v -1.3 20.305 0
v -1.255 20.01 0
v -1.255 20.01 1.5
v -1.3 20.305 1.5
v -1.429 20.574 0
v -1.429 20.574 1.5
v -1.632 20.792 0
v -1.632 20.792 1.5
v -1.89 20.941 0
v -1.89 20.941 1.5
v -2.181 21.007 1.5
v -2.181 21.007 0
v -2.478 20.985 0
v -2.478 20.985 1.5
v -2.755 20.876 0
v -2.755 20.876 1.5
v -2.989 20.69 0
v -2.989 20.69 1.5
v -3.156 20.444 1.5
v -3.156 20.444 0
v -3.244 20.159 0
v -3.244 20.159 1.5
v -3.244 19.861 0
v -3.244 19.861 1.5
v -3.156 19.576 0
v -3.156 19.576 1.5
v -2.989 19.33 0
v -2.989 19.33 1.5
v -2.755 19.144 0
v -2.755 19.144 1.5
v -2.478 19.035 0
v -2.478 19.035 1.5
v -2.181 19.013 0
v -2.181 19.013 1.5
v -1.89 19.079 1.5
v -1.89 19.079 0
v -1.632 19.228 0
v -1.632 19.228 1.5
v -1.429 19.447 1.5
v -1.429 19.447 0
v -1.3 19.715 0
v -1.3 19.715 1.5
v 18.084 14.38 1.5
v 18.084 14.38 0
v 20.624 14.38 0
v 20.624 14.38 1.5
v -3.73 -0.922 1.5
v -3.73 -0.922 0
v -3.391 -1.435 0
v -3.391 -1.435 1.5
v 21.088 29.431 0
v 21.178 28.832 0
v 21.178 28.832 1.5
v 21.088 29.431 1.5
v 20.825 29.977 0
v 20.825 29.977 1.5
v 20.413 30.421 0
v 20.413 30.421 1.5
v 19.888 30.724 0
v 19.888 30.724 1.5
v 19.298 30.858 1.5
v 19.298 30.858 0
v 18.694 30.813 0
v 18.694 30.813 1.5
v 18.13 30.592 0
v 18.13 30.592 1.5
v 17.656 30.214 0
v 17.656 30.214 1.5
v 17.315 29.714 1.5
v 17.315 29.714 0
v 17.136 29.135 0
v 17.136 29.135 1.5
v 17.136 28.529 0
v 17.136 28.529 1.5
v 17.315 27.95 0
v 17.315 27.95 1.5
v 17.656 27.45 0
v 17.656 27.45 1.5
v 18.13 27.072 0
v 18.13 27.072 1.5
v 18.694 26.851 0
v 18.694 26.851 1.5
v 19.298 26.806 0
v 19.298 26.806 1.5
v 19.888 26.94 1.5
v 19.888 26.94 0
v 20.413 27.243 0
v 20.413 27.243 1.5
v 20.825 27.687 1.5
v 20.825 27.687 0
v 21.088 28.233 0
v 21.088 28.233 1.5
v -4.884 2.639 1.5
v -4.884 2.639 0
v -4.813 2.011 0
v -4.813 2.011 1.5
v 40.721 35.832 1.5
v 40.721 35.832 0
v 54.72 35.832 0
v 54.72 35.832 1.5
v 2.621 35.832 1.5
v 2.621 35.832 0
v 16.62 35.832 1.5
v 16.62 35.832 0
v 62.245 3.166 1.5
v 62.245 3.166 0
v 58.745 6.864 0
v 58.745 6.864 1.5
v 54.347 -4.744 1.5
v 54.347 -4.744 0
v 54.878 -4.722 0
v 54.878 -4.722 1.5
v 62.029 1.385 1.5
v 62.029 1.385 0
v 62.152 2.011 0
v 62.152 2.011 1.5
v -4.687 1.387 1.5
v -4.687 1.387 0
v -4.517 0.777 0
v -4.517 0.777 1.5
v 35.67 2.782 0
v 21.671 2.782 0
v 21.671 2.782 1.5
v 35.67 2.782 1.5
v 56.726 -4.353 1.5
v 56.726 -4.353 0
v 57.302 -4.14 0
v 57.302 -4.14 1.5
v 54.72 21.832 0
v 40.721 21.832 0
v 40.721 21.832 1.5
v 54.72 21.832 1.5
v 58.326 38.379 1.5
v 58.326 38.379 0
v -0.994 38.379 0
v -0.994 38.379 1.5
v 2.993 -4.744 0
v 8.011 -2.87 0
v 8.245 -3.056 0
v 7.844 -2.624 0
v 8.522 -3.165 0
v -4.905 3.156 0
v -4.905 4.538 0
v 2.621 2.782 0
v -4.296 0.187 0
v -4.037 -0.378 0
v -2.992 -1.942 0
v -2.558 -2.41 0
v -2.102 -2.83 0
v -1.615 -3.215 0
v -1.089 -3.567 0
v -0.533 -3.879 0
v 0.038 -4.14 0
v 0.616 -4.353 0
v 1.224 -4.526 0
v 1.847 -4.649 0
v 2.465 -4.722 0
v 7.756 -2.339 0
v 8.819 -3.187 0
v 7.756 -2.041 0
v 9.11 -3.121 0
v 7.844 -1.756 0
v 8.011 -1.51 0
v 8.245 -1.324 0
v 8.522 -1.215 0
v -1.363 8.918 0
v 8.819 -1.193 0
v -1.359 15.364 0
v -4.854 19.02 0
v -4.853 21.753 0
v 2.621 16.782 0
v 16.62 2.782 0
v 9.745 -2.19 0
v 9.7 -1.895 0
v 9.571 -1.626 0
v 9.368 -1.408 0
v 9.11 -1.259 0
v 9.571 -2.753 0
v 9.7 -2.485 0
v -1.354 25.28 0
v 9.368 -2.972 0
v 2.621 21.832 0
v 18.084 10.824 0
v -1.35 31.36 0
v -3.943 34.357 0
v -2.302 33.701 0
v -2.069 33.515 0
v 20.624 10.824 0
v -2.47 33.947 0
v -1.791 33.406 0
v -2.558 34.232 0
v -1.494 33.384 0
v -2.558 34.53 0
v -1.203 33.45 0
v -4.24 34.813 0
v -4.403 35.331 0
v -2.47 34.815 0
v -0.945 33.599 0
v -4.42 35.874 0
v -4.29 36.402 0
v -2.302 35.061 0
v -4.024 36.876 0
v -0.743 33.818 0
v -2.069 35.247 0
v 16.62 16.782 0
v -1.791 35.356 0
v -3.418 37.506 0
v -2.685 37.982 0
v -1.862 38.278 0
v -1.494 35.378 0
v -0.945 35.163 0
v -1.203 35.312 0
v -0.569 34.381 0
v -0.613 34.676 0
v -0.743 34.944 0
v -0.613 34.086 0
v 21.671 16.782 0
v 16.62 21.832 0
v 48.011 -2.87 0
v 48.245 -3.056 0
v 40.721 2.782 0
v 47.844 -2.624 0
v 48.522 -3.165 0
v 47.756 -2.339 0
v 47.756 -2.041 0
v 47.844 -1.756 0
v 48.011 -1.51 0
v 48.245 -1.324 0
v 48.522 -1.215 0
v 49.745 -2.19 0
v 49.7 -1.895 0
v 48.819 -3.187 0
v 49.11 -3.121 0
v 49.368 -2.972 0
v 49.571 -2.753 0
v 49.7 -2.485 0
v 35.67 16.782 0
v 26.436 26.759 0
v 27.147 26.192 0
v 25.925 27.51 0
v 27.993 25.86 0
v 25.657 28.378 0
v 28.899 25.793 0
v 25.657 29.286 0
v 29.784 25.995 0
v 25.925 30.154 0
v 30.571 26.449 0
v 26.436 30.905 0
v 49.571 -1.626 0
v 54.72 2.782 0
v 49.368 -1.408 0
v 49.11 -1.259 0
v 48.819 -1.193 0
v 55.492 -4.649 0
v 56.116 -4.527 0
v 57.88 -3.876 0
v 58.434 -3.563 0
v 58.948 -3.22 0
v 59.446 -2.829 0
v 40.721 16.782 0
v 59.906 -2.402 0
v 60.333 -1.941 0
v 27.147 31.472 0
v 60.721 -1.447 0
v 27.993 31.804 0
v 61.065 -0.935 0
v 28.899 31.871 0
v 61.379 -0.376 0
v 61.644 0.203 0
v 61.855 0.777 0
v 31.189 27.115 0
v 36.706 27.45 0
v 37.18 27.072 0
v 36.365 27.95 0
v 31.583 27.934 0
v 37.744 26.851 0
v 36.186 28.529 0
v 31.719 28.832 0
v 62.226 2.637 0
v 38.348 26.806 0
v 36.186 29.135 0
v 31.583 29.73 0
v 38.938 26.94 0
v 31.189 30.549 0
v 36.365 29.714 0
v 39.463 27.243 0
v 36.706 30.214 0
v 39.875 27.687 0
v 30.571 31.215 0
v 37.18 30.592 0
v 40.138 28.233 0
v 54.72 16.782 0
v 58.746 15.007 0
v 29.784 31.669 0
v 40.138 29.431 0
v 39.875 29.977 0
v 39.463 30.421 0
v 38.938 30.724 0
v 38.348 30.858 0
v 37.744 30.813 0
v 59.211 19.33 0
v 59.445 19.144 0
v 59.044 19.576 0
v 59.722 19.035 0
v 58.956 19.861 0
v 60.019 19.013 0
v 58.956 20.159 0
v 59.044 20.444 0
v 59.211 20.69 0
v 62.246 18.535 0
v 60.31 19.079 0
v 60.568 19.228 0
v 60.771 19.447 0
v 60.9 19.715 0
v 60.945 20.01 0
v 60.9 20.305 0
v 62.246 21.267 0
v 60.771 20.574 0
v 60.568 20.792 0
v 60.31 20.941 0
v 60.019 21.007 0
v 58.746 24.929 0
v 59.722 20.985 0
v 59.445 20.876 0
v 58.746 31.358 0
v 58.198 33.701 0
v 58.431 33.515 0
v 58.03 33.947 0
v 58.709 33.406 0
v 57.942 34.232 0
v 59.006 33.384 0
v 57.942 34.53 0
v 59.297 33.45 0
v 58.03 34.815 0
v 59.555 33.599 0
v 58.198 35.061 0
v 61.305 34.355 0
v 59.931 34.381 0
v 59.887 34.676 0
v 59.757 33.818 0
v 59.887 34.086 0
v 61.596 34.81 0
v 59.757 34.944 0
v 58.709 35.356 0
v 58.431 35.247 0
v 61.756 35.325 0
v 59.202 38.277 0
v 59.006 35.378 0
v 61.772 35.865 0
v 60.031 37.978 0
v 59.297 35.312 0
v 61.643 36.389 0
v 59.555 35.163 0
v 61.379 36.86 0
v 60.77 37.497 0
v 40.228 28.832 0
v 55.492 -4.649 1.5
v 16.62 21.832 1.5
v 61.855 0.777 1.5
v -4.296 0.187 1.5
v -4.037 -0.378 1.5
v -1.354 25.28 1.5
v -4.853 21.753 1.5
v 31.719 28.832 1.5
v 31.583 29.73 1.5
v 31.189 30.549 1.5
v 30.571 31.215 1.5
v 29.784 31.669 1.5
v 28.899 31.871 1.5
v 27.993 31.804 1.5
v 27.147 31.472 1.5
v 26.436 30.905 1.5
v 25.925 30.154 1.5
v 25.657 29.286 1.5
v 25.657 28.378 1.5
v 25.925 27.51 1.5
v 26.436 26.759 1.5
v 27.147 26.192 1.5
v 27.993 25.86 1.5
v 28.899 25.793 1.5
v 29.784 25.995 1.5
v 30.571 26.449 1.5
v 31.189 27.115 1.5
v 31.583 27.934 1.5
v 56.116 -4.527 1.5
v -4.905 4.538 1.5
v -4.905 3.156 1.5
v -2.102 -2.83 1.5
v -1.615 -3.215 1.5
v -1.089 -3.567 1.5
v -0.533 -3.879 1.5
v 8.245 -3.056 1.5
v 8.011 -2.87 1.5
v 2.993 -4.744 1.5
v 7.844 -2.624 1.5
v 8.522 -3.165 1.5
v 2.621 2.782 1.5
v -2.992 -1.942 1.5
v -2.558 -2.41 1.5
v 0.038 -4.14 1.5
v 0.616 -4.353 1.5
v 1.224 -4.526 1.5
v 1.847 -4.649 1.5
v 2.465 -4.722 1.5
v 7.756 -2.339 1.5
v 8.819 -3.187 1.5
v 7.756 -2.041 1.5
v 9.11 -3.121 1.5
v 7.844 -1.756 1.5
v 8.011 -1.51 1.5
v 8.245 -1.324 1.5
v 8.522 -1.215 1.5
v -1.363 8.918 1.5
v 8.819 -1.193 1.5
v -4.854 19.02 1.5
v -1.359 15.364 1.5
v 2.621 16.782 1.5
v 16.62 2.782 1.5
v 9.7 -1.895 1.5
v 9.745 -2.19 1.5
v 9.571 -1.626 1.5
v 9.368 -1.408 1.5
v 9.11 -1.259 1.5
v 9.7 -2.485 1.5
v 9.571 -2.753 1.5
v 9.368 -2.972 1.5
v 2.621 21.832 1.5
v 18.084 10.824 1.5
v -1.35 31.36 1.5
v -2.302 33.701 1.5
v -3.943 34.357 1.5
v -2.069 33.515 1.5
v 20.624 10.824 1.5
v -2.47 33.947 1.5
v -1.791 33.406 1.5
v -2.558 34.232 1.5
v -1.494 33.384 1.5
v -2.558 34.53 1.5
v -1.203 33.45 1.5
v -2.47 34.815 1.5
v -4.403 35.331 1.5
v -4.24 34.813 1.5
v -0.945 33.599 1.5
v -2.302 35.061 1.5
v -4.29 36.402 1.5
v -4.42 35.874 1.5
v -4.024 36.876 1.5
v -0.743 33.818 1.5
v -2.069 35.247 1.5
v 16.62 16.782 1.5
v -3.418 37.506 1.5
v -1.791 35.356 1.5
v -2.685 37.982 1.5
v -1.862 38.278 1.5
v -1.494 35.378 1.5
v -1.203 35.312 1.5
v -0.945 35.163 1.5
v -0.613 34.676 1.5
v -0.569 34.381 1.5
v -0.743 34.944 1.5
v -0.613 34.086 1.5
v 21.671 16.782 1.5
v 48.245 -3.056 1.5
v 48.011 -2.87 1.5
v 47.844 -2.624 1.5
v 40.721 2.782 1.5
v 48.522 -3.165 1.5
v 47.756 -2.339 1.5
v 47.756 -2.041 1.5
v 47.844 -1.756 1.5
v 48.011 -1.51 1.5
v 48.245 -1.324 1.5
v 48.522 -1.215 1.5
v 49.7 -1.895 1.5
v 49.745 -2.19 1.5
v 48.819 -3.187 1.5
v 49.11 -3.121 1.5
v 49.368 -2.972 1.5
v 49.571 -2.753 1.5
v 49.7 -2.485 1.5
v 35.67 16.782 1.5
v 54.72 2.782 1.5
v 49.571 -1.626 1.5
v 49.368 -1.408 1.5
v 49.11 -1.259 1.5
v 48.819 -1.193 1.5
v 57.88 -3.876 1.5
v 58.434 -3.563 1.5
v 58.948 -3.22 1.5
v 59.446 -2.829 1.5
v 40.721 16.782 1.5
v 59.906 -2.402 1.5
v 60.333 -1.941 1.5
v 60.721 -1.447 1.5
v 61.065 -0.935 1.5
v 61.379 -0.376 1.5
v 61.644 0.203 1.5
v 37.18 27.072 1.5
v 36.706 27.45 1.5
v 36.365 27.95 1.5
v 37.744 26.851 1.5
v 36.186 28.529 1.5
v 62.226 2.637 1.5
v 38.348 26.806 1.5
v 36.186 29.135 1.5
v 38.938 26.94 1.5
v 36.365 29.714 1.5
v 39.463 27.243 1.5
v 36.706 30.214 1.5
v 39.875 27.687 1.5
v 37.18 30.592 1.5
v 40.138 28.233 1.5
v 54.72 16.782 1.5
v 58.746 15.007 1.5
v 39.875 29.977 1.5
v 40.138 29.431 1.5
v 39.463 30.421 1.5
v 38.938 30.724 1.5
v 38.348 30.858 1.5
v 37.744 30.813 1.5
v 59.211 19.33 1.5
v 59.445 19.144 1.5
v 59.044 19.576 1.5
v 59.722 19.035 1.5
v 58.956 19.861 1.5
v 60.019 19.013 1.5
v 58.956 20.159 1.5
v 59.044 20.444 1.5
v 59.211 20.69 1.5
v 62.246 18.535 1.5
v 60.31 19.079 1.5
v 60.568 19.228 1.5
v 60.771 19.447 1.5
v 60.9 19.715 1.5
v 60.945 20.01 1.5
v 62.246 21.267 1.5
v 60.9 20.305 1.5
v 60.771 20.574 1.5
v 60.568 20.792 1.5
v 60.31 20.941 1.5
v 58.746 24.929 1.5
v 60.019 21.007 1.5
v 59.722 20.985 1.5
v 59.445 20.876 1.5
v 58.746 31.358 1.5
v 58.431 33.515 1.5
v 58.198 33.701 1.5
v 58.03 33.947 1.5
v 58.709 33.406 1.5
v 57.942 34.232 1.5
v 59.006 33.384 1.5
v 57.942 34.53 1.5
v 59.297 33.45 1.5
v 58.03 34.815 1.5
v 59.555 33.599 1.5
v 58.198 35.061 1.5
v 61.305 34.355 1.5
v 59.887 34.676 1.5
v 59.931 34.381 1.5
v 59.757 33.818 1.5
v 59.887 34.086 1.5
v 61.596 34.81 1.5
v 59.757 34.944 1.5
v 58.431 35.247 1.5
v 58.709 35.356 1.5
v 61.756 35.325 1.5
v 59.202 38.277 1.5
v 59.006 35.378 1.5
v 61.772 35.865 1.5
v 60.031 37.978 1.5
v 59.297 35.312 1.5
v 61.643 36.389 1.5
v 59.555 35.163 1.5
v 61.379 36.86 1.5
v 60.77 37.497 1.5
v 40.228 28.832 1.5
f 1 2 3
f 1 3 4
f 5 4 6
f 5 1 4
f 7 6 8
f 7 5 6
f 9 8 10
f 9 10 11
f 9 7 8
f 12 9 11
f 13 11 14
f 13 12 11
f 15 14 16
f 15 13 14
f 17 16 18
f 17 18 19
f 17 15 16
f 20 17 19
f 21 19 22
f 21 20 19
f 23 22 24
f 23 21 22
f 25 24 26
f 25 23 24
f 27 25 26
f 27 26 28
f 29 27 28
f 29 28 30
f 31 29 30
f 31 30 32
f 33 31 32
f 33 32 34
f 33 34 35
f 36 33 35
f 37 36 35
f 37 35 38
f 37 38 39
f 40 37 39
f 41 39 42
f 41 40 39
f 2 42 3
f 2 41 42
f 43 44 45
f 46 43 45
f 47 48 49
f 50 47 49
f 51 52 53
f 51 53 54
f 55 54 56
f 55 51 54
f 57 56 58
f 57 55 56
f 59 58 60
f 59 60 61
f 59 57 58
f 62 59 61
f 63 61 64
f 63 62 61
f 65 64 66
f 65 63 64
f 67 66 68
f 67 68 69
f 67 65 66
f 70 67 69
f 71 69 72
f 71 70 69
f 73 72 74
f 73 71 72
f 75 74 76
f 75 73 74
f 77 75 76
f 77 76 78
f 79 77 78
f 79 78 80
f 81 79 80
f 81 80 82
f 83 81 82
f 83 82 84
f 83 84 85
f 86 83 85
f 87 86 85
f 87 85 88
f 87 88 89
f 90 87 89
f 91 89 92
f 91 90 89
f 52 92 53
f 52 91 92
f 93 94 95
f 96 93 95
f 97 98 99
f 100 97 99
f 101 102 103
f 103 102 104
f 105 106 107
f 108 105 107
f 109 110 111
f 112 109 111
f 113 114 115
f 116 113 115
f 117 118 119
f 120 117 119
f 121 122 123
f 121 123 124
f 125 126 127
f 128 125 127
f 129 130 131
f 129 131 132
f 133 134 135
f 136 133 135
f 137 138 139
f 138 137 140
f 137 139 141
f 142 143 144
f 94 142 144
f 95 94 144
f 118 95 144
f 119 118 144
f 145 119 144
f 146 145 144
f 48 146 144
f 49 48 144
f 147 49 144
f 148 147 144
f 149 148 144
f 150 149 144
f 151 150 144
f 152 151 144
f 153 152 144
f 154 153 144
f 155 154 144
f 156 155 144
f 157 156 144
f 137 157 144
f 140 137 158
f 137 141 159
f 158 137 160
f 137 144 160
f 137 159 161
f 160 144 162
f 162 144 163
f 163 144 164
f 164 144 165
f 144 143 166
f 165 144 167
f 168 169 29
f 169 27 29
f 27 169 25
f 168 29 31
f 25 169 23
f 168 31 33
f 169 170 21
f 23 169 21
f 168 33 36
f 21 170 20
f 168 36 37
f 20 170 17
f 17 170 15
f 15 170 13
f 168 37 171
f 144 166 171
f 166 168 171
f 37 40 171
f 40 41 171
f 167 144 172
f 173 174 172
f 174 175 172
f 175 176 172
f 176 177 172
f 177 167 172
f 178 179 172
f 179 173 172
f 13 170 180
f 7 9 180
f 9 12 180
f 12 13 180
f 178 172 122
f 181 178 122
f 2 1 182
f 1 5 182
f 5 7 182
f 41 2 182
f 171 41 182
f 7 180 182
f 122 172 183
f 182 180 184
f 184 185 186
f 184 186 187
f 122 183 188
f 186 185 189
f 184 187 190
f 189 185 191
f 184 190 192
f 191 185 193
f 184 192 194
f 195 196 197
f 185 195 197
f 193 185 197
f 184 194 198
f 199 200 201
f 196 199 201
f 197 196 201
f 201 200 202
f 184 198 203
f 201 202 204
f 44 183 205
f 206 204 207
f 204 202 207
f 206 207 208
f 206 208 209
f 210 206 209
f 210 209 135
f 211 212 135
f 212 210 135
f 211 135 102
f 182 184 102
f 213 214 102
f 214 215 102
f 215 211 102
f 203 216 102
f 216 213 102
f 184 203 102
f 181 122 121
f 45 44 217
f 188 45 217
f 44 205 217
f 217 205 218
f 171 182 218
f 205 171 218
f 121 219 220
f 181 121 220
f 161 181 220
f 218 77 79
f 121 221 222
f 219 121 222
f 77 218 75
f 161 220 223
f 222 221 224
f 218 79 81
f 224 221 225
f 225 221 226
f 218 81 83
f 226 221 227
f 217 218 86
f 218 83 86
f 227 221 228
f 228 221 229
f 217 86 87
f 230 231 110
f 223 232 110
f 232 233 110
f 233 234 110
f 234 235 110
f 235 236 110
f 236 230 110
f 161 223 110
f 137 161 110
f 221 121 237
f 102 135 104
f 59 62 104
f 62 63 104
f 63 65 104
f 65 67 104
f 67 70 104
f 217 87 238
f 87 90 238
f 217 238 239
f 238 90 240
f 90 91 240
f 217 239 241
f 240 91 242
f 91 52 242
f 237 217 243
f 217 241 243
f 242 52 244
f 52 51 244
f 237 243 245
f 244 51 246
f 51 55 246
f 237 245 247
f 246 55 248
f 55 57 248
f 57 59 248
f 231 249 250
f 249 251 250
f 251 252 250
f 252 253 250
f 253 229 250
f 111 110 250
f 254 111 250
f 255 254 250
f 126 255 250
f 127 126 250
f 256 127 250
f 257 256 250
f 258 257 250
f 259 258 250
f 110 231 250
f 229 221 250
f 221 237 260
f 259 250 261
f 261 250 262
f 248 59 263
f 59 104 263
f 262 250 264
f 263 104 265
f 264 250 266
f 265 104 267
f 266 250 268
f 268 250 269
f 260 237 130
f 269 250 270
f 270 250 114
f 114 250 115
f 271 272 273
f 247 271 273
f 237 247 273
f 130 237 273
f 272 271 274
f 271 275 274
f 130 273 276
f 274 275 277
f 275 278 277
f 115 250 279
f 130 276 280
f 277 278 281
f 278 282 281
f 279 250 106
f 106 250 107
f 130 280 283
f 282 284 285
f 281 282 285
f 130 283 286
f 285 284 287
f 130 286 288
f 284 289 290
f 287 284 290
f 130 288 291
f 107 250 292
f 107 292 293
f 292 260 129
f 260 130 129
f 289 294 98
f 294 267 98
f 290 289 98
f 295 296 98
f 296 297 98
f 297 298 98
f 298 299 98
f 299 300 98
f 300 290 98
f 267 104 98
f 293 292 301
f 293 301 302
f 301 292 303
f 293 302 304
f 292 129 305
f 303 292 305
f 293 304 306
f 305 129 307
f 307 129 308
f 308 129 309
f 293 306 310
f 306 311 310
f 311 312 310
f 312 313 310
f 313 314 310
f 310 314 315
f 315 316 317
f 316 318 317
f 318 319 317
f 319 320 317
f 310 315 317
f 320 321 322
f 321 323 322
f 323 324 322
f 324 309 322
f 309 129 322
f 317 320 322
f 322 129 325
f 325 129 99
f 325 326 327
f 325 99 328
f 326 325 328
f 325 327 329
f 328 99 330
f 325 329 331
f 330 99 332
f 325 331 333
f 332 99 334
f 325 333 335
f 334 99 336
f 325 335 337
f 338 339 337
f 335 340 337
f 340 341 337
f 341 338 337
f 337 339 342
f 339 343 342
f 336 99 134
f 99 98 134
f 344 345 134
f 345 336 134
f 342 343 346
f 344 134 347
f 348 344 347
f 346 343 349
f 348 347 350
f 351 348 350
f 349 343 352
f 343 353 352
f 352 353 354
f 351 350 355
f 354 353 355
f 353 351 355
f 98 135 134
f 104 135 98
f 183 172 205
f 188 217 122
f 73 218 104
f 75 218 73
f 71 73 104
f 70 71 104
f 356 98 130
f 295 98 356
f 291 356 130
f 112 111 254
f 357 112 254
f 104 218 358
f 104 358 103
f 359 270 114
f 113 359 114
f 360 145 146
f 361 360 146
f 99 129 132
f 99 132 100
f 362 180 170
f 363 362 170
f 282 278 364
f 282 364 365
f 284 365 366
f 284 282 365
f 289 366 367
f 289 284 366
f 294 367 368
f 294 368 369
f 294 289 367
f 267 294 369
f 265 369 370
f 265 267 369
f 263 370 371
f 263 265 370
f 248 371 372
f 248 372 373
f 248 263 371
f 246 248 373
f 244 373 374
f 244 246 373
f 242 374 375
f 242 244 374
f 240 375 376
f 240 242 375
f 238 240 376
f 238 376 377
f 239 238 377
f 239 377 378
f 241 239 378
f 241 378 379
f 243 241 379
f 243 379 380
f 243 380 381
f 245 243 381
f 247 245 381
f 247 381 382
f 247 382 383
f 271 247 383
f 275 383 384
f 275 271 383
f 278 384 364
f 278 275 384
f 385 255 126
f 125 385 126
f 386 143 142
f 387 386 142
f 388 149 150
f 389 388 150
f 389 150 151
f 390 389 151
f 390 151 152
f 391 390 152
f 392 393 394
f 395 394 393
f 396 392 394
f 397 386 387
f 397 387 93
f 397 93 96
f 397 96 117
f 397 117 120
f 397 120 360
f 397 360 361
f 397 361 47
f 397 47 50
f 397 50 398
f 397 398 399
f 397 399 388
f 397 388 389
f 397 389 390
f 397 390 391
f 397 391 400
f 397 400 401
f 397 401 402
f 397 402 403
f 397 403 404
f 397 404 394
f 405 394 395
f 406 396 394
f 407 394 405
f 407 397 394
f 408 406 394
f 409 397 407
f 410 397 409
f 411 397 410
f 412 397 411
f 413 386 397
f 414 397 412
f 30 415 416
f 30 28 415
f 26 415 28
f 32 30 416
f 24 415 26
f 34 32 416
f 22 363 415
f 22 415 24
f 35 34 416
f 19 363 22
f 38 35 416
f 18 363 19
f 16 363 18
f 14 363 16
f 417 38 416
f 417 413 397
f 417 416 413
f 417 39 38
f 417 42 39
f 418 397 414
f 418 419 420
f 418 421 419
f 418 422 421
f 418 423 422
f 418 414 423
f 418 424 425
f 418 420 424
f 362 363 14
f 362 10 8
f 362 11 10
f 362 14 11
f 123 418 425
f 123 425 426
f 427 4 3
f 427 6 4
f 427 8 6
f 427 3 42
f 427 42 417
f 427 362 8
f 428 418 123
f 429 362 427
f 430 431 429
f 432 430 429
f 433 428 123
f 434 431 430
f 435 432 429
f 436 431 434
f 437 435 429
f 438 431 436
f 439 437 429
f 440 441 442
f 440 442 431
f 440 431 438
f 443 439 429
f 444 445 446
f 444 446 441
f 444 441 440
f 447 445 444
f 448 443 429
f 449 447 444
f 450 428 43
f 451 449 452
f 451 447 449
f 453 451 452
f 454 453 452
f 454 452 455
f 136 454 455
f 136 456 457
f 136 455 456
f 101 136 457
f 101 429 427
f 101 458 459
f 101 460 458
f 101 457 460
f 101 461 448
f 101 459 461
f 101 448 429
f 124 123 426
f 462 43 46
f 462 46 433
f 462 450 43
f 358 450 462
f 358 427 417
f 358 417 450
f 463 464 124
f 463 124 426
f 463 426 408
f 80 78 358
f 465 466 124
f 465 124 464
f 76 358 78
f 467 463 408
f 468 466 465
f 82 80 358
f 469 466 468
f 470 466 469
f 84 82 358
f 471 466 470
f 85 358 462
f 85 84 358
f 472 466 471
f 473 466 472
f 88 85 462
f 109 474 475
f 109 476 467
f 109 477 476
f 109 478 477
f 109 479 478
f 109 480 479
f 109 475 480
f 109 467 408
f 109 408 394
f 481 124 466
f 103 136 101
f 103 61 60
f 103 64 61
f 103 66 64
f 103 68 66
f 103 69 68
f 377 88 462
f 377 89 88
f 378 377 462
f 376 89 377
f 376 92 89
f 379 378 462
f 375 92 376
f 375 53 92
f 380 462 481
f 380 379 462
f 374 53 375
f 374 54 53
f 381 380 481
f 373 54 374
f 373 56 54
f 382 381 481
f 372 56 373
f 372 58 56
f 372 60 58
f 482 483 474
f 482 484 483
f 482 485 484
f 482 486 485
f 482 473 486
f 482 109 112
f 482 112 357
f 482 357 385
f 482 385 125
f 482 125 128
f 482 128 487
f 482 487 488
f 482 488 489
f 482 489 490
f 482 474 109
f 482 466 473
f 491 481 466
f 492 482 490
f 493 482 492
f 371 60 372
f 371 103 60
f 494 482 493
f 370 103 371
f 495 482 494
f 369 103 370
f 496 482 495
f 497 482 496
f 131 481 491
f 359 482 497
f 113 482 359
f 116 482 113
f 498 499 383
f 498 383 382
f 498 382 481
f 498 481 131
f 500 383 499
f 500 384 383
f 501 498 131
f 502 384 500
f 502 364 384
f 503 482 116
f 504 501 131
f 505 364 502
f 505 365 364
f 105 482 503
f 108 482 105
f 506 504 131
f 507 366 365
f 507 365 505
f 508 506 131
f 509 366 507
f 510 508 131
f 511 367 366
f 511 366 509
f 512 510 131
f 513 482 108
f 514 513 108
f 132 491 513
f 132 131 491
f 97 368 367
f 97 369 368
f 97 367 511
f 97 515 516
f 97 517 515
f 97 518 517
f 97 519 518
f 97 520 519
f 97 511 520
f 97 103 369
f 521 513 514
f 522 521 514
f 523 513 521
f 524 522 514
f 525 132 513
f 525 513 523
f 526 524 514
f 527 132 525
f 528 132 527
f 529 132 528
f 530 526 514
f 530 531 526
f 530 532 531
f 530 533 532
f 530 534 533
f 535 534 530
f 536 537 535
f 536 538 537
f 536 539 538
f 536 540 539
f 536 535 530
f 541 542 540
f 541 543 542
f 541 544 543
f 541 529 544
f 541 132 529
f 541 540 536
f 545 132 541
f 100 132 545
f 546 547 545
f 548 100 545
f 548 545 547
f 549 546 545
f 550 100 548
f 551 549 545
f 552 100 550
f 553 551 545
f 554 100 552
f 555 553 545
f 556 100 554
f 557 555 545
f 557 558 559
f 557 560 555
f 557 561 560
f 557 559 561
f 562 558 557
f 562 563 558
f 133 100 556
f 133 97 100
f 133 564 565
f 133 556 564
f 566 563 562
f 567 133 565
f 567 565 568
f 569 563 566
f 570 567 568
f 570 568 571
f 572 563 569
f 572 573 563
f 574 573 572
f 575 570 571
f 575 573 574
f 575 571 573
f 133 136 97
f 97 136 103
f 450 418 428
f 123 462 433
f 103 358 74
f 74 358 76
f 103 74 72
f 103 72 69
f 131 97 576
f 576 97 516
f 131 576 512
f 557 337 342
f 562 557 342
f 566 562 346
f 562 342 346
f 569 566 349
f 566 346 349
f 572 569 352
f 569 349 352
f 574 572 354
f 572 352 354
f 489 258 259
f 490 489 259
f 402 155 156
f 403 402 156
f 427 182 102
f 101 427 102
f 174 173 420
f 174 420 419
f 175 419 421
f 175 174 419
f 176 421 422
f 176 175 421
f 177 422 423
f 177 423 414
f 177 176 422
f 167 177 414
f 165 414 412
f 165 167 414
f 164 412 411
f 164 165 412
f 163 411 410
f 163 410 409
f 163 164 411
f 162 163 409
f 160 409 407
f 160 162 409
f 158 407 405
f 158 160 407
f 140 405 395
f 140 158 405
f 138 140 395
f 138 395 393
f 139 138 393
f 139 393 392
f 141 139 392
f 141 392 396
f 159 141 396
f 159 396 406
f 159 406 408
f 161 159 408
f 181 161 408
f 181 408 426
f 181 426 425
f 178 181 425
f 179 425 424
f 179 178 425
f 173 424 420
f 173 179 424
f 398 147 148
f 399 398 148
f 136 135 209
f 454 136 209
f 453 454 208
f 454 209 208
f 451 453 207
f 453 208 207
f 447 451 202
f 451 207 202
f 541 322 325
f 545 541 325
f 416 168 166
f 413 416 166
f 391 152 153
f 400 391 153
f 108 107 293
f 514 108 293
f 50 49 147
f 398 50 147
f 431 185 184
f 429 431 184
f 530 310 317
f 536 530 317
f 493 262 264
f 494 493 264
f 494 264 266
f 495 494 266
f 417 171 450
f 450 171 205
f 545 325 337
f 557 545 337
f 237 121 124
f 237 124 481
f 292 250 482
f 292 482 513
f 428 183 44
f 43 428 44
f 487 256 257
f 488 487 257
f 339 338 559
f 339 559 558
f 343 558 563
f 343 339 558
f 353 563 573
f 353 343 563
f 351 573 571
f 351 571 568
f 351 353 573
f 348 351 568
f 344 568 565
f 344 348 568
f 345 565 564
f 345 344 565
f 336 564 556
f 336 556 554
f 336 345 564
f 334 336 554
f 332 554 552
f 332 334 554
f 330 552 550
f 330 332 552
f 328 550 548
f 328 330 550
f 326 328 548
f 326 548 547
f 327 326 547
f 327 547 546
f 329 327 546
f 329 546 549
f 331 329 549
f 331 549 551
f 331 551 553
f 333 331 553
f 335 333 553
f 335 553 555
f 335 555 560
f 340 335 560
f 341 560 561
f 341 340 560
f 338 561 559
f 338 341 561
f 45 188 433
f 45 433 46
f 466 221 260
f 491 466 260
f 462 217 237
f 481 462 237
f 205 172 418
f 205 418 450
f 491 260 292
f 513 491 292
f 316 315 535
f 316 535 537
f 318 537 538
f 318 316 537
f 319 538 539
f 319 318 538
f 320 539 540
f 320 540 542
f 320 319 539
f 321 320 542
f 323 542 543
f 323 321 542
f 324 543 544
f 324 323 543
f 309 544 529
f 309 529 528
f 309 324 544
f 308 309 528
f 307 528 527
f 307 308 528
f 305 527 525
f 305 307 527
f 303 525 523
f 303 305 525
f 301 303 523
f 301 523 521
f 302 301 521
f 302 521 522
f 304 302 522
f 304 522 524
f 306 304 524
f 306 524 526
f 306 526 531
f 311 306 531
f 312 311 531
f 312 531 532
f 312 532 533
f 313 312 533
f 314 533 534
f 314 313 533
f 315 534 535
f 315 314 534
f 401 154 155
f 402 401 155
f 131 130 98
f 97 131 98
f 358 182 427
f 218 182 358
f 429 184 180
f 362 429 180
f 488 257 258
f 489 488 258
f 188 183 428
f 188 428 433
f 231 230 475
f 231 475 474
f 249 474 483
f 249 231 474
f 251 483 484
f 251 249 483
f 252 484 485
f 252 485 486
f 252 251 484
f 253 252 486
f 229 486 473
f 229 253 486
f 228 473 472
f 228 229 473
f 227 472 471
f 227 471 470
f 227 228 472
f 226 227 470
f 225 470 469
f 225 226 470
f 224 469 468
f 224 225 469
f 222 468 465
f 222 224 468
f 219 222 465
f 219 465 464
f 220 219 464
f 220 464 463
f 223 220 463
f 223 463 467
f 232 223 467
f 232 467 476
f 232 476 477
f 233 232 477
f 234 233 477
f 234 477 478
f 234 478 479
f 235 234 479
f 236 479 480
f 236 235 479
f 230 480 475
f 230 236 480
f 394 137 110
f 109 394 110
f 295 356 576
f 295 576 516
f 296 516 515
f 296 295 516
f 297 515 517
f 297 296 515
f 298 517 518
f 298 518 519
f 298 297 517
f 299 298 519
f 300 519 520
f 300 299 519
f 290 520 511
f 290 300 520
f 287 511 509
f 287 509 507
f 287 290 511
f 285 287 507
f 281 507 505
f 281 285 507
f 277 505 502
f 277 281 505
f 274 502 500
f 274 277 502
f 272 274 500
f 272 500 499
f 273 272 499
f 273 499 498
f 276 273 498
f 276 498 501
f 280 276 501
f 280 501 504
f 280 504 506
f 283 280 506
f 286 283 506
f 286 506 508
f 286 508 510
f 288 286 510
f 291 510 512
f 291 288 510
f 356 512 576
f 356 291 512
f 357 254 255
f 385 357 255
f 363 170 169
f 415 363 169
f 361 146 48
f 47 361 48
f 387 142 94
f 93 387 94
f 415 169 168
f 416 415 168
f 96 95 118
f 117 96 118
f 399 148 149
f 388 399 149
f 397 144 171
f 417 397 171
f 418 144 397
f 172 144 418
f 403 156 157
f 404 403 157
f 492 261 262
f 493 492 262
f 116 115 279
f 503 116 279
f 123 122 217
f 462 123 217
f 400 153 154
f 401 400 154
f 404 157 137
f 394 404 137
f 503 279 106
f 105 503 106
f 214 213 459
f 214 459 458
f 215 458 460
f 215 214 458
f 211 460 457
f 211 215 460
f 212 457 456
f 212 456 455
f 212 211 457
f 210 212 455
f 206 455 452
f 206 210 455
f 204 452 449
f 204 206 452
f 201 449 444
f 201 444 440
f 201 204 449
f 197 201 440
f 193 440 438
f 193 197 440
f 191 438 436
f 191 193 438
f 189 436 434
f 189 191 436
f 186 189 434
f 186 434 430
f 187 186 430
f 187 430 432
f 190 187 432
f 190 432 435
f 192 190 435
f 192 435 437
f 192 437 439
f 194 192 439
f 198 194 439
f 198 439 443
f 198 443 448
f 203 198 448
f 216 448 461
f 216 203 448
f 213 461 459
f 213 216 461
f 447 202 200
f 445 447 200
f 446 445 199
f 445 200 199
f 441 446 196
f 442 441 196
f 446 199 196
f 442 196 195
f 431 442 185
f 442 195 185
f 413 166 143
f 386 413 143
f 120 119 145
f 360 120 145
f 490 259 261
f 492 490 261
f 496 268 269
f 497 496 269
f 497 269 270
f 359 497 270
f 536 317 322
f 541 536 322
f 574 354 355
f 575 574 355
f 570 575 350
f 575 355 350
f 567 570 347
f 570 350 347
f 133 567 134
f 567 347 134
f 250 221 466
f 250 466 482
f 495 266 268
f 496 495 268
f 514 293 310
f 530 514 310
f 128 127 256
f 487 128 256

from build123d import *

# Parameters (mm, degrees)
MODEL_R         = 1
MODEL_W         = 13.99947
MODEL_H         = 13.99944
MODEL_W_2       = 2.54
MODEL_H_2       = 3.556
MODEL_W_3       = 13.9994
MODEL_W_4       = 13.9993
MODEL_H_3       = 13.9993
MODEL_R_2       = 2.032
MODEL_R_3       = 3.048
EXTRUDE_1_DEPTH = 1.5


with BuildPart() as part:
    # Model → 凸台-拉伸1 (new body)
    with BuildSketch(Plane.XY):
        with BuildLine():
            Line((58.325971896, 38.37894176), (-0.993511809, 38.37894176))
            ThreePointArc((-0.993511809, 38.37894176), (-2.684760262, 37.982445858), (-4.023562246, 36.875585623))
            ThreePointArc((-4.023562246, 36.875585623), (-4.429985557, 35.602098535), (-3.943386617, 34.357040005))
            Line((-3.943386617, 34.357040005), (-1.350000064, 31.36000149))
            Line((-1.350000064, 31.36000149), (-1.353515518, 25.280051374))
            Line((-1.353515518, 25.280051374), (-4.853428588, 21.752613865))
            Line((-4.853428588, 21.752613865), (-4.853710523, 19.020120221))
            Line((-4.853710523, 19.020120221), (-1.359258514, 15.363920359))
            Line((-1.359258514, 15.363920359), (-1.362991715, 8.917997305))
            Line((-1.362991715, 8.917997305), (-4.9049154, 4.538497879))
            Line((-4.9049154, 4.538497879), (-4.9049154, 3.15597541))
            Line((-4.9049154, 3.15597541), (-4.883883595, 2.639206616))
            Line((-4.883883595, 2.639206616), (-4.813264805, 2.011073476))
            Line((-4.813264805, 2.011073476), (-4.687062167, 1.387481119))
            Line((-4.687062167, 1.387481119), (-4.516803943, 0.776764684))
            Line((-4.516803943, 0.776764684), (-4.295659415, 0.187060206))
            Line((-4.295659415, 0.187060206), (-4.03681533, -0.378036856))
            Line((-4.03681533, -0.378036856), (-3.730362364, -0.921623746))
            Line((-3.730362364, -0.921623746), (-3.390574278, -1.434889052))
            Line((-3.390574278, -1.434889052), (-2.992281832, -1.942165148))
            Line((-2.992281832, -1.942165148), (-2.558331876, -2.409802006))
            Line((-2.558331876, -2.409802006), (-2.102251702, -2.829663369))
            Line((-2.102251702, -2.829663369), (-1.614610519, -3.215411153))
            Line((-1.614610519, -3.215411153), (-1.088890304, -3.567123565))
            Line((-1.088890304, -3.567123565), (-0.532800957, -3.878547051))
            Line((-0.532800957, -3.878547051), (0.038326794, -4.140153507))
            Line((0.038326794, -4.140153507), (0.615600502, -4.353028424))
            Line((0.615600502, -4.353028424), (1.223529929, -4.526191258))
            Line((1.223529929, -4.526191258), (1.847223482, -4.64943937))
            Line((1.847223482, -4.64943937), (2.464503115, -4.722060038))
            Line((2.464503115, -4.722060038), (2.992774524, -4.743685))
            Line((2.992774524, -4.743685), (54.34686609, -4.743685))
            Line((54.34686609, -4.743685), (54.87843401, -4.722059086))
            Line((54.87843401, -4.722059086), (55.492240411, -4.649391053))
            Line((55.492240411, -4.649391053), (56.11599848, -4.526806688))
            Line((56.11599848, -4.526806688), (56.726168878, -4.352867841))
            Line((56.726168878, -4.352867841), (57.302144081, -4.140491025))
            Line((57.302144081, -4.140491025), (57.880206411, -3.875955859))
            Line((57.880206411, -3.875955859), (58.434482529, -3.563431063))
            Line((58.434482529, -3.563431063), (58.947571314, -3.220379587))
            Line((58.947571314, -3.220379587), (59.445938304, -2.8287768))
            Line((59.445938304, -2.8287768), (59.905767444, -2.401934126))
            Line((59.905767444, -2.401934126), (60.332973054, -1.941418241))
            Line((60.332973054, -1.941418241), (60.721224007, -1.446690794))
            Line((60.721224007, -1.446690794), (61.064717919, -0.934798534))
            Line((61.064717919, -0.934798534), (61.379380282, -0.376374826))
            Line((61.379380282, -0.376374826), (61.644240363, 0.202684675))
            Line((61.644240363, 0.202684675), (61.855333273, 0.776565869))
            Line((61.855333273, 0.776565869), (62.029241049, 1.384922025))
            Line((62.029241049, 1.384922025), (62.152356641, 2.011350393))
            Line((62.152356641, 2.011350393), (62.226202972, 2.636734827))
            Line((62.226202972, 2.636734827), (62.245297192, 3.166071528))
            Line((62.245297192, 3.166071528), (58.745412398, 6.86443549))
            Line((58.745412398, 6.86443549), (58.745666056, 15.007268129))
            Line((58.745666056, 15.007268129), (62.245579127, 18.534705638))
            Line((62.245579127, 18.534705638), (62.245861062, 21.267199282))
            Line((62.245861062, 21.267199282), (58.745975132, 24.929084585))
            Line((58.745975132, 24.929084585), (58.746175407, 31.358234918))
            Line((58.746175407, 31.358234918), (61.304557204, 34.355344918))
            ThreePointArc((61.304557204, 34.355344918), (61.782522432, 35.594711806), (61.37863268, 36.860158015))
            ThreePointArc((61.37863268, 36.860158015), (60.030777011, 37.978272972), (58.325971896, 38.37894176))
        make_face()
        with Locations((8.744501265, -2.189788582)):
            Circle(MODEL_R, mode=Mode.SUBTRACT)
        with Locations((9.620765, 9.78198)):
            Rectangle(MODEL_W, MODEL_H, mode=Mode.SUBTRACT)
        with Locations((19.353985322, 12.60229784)):
            Rectangle(MODEL_W_2, MODEL_H_2, mode=Mode.SUBTRACT)
        with Locations((48.744501265, -2.189788582)):
            Circle(MODEL_R, mode=Mode.SUBTRACT)
        with Locations((28.6707, 9.78198)):
            Rectangle(MODEL_W_3, MODEL_H, mode=Mode.SUBTRACT)
        with Locations((47.72075, 9.78198)):
            Rectangle(MODEL_W_4, MODEL_H, mode=Mode.SUBTRACT)
        with Locations((-2.255498735, 20.010211418)):
            Circle(MODEL_R, mode=Mode.SUBTRACT)
        with Locations((9.620765, 28.83195)):
            Rectangle(MODEL_W, MODEL_H_3, mode=Mode.SUBTRACT)
        with Locations((-1.568763471, 34.380826193)):
            Circle(MODEL_R, mode=Mode.SUBTRACT)
        with Locations((19.1458, 28.832)):
            Circle(MODEL_R_2, mode=Mode.SUBTRACT)
        with Locations((59.944501265, 20.010211418)):
            Circle(MODEL_R, mode=Mode.SUBTRACT)
        with Locations((28.6708, 28.832)):
            Circle(MODEL_R_3, mode=Mode.SUBTRACT)
        with Locations((38.1958, 28.832)):
            Circle(MODEL_R_2, mode=Mode.SUBTRACT)
        with Locations((47.72075, 28.83195)):
            Rectangle(MODEL_W_4, MODEL_H_3, mode=Mode.SUBTRACT)
        with Locations((58.931236529, 34.380826193)):
            Circle(MODEL_R, mode=Mode.SUBTRACT)
    extrude(amount=EXTRUDE_1_DEPTH)


solid = part.part
